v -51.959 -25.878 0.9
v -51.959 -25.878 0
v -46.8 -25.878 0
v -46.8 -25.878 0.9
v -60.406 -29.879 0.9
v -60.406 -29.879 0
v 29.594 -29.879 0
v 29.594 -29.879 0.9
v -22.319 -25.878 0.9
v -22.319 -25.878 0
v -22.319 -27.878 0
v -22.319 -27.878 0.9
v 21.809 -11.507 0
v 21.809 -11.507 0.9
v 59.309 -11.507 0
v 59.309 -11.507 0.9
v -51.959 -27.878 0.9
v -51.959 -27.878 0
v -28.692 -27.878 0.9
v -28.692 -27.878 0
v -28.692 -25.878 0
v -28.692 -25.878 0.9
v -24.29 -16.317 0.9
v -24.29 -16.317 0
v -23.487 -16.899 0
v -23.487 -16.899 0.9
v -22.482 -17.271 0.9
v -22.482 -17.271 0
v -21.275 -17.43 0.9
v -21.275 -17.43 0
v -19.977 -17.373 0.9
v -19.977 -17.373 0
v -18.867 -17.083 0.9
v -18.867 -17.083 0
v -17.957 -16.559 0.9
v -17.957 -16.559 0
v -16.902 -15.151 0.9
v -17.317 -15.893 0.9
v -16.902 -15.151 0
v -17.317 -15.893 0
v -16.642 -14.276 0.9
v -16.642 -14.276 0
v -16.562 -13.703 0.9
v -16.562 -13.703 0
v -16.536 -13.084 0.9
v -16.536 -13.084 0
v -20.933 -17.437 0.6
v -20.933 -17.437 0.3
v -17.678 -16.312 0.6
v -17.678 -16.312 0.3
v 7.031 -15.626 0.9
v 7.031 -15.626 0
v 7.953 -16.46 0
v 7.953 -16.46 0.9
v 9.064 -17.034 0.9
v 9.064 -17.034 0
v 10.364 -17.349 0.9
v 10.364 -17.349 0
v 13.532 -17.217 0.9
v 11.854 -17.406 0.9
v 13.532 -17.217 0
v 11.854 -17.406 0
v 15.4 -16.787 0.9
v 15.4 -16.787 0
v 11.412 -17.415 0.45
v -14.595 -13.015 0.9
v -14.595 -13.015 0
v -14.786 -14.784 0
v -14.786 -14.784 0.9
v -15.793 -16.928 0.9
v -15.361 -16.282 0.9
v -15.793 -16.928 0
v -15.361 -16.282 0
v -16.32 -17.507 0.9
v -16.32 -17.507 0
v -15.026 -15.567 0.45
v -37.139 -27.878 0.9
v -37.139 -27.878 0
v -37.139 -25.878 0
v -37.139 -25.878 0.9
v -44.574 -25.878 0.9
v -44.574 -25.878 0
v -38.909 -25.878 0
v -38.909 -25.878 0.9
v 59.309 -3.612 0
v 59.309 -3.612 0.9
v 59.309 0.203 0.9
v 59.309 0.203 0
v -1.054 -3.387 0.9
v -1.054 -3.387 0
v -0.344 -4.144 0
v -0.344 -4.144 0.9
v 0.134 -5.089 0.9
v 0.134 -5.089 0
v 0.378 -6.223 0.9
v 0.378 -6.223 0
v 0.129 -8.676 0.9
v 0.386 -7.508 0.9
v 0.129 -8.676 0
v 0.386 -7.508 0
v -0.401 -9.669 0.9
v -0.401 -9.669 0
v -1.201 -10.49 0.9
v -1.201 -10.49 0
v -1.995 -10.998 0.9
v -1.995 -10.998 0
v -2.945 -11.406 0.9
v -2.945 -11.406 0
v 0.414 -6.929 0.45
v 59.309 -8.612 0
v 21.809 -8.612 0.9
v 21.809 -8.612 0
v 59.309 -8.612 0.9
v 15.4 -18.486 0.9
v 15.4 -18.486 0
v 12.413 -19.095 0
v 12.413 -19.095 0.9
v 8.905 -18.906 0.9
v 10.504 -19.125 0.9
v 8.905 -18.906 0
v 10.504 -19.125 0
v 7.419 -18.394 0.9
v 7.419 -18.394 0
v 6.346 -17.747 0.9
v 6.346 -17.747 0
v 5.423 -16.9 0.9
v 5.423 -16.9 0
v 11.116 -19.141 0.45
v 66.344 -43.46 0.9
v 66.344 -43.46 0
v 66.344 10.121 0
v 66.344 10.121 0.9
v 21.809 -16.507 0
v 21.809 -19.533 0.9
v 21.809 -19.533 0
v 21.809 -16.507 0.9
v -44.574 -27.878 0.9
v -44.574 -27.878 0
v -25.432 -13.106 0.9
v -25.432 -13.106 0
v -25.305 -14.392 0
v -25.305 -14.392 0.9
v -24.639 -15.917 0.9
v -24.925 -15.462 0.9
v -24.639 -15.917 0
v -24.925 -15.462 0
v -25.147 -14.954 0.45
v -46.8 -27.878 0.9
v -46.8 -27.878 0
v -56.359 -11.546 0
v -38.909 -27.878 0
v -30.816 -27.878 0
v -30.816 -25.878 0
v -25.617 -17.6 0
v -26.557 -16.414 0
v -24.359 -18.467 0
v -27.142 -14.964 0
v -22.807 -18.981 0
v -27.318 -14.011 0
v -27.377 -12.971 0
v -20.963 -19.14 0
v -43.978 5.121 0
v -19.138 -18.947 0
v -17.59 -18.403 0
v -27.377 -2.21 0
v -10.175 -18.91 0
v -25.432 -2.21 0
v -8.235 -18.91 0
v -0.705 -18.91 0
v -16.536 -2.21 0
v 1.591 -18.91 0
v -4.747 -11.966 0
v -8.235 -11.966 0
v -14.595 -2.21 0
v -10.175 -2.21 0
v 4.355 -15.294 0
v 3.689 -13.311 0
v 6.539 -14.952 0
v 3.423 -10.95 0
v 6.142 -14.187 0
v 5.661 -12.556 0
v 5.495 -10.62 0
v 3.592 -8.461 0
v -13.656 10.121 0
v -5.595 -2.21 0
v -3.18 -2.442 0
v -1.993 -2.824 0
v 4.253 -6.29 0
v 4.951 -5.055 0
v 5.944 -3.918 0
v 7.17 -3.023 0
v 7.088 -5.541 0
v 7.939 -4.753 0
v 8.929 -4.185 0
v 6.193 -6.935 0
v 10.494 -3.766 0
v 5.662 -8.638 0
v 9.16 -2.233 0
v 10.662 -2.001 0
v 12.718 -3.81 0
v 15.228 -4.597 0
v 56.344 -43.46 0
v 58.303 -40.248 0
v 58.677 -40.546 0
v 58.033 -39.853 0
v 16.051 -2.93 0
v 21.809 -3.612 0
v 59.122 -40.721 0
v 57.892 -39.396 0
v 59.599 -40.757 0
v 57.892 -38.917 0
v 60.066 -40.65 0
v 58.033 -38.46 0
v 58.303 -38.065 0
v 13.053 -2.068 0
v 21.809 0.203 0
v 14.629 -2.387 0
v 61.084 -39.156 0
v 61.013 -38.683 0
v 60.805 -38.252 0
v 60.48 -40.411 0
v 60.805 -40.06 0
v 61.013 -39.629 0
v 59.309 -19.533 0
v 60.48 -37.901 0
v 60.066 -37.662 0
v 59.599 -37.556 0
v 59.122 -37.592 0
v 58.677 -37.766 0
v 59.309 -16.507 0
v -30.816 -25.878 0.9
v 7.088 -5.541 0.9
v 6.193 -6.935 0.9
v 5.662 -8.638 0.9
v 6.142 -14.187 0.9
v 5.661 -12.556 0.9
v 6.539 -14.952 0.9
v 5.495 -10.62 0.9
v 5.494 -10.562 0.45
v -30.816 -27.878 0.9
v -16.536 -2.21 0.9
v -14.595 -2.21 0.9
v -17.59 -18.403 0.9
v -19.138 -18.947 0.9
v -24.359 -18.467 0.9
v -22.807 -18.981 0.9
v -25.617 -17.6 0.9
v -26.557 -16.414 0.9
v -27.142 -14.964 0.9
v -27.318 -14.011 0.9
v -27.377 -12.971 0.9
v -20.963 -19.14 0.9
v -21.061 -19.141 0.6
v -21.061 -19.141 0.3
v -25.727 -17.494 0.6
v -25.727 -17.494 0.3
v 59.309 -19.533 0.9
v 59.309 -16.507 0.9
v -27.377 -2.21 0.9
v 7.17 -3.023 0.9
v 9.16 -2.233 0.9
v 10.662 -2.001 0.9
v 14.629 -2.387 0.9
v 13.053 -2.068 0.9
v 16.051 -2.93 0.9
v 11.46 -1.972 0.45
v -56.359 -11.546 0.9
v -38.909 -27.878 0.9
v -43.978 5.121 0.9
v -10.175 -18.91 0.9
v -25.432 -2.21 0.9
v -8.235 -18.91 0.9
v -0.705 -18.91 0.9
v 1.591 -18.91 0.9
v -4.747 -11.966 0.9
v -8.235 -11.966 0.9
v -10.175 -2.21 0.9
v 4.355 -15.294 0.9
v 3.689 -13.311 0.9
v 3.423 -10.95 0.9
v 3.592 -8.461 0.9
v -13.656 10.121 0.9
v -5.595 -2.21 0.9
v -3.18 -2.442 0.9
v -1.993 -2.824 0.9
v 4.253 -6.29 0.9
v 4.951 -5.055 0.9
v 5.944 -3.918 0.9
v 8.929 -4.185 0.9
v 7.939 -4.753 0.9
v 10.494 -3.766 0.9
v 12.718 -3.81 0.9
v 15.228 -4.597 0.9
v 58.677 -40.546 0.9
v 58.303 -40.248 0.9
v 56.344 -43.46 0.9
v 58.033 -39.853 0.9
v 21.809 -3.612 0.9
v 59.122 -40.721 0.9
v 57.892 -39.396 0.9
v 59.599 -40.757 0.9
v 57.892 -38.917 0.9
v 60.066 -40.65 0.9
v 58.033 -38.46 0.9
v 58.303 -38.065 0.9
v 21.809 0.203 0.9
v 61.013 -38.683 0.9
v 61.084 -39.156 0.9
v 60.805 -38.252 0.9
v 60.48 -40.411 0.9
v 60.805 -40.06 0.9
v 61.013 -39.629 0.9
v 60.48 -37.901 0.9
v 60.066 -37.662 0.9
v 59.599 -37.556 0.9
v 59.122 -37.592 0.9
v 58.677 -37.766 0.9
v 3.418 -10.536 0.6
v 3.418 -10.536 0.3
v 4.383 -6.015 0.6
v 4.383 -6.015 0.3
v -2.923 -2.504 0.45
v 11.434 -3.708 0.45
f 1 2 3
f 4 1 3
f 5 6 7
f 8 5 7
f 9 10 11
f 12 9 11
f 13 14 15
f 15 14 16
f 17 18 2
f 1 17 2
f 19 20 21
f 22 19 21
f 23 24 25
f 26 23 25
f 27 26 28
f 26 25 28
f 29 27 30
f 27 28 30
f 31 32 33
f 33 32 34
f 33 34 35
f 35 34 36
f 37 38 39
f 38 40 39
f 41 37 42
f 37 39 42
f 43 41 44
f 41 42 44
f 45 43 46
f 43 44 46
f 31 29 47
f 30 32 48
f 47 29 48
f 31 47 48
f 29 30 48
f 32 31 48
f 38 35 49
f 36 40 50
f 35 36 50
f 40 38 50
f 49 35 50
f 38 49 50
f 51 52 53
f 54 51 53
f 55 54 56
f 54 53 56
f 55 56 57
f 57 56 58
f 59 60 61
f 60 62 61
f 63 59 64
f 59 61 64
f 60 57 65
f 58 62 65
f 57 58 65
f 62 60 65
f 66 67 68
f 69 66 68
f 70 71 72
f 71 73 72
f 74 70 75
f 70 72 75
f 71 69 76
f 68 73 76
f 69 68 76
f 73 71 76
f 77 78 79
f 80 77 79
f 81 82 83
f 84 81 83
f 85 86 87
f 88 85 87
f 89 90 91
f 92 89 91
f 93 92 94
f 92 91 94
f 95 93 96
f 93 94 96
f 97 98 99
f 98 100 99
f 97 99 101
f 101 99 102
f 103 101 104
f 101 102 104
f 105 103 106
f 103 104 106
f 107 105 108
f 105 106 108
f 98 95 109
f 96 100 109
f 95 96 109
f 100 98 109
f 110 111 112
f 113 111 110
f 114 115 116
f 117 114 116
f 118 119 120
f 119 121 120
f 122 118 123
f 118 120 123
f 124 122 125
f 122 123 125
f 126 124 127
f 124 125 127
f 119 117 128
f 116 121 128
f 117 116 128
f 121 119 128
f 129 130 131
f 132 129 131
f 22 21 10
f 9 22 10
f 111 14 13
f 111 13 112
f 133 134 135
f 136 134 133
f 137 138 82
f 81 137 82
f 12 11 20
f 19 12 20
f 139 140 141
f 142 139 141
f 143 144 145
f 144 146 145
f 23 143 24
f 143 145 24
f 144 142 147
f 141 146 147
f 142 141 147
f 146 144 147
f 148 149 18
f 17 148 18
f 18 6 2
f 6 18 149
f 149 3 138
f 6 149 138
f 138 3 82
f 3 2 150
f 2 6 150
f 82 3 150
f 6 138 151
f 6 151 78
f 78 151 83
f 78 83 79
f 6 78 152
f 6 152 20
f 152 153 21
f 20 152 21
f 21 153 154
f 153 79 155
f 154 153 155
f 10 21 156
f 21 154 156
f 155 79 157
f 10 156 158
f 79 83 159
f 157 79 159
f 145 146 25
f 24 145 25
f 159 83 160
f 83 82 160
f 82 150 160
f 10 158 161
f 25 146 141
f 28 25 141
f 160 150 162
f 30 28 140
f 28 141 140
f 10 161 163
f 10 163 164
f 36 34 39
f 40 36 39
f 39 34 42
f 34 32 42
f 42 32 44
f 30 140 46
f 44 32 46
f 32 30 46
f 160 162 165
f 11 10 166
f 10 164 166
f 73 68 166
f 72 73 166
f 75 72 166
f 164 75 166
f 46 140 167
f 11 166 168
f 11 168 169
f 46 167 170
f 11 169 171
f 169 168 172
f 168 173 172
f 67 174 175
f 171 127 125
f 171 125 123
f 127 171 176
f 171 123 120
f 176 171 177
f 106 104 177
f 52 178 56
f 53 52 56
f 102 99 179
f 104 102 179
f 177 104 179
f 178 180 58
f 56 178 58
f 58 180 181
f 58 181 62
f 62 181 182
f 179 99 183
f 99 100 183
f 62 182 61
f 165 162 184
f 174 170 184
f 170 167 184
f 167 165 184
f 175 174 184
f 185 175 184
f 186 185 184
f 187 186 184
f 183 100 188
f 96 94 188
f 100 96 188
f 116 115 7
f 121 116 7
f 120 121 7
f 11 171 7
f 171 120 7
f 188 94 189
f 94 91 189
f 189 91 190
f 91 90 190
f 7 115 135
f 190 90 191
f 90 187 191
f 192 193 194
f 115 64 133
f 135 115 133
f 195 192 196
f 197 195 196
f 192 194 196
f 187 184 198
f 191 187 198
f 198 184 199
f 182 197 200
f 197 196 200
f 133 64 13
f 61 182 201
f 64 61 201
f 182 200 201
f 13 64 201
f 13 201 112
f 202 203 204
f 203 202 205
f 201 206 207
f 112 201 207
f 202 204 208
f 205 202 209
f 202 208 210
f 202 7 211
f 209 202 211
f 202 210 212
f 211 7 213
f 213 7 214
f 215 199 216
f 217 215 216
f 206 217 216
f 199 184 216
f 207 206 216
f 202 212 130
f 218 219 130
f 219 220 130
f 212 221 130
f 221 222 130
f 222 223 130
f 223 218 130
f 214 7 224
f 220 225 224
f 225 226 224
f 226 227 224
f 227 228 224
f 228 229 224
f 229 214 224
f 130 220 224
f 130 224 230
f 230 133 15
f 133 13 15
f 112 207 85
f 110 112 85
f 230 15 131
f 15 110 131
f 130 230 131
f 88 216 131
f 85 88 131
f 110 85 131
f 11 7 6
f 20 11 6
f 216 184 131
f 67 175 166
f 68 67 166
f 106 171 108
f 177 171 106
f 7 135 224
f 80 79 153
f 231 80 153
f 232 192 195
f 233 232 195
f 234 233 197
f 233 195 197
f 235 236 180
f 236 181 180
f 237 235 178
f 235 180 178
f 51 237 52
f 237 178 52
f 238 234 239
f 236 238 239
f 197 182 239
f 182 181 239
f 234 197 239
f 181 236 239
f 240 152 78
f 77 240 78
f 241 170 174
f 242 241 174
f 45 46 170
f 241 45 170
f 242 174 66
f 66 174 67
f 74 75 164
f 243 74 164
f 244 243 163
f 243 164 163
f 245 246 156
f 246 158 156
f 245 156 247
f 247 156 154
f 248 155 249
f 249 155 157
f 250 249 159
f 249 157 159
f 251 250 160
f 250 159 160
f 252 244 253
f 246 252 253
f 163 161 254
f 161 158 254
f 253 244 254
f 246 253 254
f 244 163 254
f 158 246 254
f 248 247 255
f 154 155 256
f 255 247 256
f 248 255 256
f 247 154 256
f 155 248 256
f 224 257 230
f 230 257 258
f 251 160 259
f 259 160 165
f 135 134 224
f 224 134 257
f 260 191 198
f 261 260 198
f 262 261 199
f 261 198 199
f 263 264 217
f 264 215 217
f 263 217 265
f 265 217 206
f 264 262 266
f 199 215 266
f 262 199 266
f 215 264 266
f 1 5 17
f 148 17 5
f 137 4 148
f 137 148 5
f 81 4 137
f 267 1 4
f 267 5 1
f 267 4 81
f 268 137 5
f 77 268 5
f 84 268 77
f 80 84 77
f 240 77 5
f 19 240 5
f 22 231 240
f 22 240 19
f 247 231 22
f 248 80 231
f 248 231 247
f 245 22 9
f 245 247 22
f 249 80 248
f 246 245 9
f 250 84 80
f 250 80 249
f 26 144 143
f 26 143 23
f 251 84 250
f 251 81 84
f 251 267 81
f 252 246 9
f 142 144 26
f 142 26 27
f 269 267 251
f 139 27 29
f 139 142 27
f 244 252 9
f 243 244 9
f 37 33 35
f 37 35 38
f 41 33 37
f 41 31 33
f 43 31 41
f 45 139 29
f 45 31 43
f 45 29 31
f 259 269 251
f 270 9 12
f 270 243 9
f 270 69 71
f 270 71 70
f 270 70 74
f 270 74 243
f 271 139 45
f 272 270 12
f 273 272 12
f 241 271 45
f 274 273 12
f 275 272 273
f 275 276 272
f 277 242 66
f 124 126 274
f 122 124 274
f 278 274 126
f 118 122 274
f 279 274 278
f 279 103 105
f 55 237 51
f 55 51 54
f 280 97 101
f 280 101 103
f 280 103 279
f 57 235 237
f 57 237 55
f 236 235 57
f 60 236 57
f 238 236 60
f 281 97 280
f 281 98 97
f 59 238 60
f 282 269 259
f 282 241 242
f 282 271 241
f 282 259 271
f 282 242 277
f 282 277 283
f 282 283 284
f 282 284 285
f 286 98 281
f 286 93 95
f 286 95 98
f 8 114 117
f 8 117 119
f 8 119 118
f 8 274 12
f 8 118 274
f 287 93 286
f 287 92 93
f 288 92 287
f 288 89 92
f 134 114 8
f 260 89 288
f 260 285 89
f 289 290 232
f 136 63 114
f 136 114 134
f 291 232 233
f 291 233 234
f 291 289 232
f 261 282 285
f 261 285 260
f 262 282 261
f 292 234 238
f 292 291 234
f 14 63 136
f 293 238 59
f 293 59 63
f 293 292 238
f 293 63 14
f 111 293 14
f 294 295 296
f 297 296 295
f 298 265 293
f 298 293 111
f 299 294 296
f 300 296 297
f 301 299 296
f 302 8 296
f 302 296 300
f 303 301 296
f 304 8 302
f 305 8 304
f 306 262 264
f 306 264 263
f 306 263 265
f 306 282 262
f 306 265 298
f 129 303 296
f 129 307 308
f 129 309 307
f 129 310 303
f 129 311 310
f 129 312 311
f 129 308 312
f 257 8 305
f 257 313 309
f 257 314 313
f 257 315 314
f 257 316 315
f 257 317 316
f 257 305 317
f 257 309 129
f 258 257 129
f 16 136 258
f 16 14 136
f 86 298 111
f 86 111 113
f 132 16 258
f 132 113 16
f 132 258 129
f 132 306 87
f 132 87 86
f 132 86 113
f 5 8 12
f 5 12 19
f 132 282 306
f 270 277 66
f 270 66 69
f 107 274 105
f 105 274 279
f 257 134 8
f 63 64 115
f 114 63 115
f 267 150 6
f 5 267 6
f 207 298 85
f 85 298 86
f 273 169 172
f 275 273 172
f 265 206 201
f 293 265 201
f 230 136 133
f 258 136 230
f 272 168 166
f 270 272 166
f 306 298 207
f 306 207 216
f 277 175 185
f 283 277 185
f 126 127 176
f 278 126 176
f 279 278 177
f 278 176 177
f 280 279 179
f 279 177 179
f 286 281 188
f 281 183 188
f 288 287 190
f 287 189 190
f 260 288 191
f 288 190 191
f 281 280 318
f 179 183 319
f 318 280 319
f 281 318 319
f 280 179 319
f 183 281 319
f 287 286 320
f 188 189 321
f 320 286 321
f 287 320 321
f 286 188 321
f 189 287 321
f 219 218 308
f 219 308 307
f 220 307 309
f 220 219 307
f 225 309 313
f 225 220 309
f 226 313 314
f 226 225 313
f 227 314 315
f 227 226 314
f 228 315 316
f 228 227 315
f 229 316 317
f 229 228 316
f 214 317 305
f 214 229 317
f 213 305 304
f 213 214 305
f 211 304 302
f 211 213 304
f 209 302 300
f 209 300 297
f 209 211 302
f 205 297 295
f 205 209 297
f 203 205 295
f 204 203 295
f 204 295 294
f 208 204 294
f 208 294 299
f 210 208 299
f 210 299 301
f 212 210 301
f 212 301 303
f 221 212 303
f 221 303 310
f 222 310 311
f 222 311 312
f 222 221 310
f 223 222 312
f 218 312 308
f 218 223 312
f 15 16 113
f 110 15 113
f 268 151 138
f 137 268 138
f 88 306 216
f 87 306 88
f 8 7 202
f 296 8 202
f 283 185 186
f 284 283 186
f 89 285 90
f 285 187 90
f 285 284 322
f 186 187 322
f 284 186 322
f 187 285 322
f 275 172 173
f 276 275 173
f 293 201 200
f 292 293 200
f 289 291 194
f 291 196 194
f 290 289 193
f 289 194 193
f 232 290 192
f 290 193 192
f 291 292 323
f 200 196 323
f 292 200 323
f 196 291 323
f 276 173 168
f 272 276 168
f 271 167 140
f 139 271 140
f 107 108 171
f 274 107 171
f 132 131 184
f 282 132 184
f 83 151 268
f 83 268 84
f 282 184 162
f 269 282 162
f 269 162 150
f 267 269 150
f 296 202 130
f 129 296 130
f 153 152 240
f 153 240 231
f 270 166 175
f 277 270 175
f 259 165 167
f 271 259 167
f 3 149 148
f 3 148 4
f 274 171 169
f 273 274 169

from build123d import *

# Parameters (mm, degrees)
F0_R     = 1.6050327283
F0_W     = 2.2255629301
F0_H     = 2
F0_W_2   = 1.7703343183
F0_W_3   = 2.1244008094
F1_DEPTH = 0.9
F3_W     = 37.4999957172
F3_H     = 3.8157890567
F3_H_2   = 3.0263150231
F3_H_3   = 2.8947356249
F4_DEPTH = 0.9


with BuildPart() as f1:
    # F0 (on Top) → F1 (new body)
    with BuildSketch(Plane.XY):
        Polygon((-56.3586414655, -11.5456737704), (-60.406261386, -29.879005636), (29.593738614, -29.879005636), (56.3437383481, -43.4597830152), (66.3437383481, -43.4597830152), (66.3437383481, 10.120994364), (-13.6562616519, 10.120994364), (-43.9776898843, 5.1209918552), align=None)
        Polygon((-51.9591234624, -27.8780460358), (-51.9591234624, -25.8780460358), (-46.79986462, -25.8780460358), (-44.5743016899, -25.8780460358), (-38.9092303813, -25.8780460358), (-37.138896063, -25.8780460358), (-30.8162737638, -25.8780460358), (-28.6918729544, -25.8780460358), (-22.3186686635, -25.8780460358), (-22.3186686635, -27.8780460358), (-28.6918729544, -27.8780460358), (-30.8162737638, -27.8780460358), (-37.138896063, -27.8780460358), (-38.9092303813, -27.8780460358), (-44.5743016899, -27.8780460358), (-46.79986462, -27.8780460358), align=None, mode=Mode.SUBTRACT)
        with Locations((59.4792403281, -39.1563028097)):
            Circle(F0_R, mode=Mode.SUBTRACT)
        with BuildLine():
            Line((-16.5355233229, -2.2097615232), (-14.5946062265, -2.2097615232))
            Line((-14.5946062265, -2.2097615232), (-14.5946062265, -13.0145655474))
            add(Edge.make_bspline(
                [(-14.5946062265, -13.0145655474), (-14.5946062265, -15.8729406309), (-16.3198658677, -17.5068199945)],
                knots=[0, 0, 0, 1, 1, 1], degree=2))
            add(Edge.make_bspline(
                [(-16.3198658677, -17.5068199945), (-18.045125509, -19.1406993581), (-21.06067467, -19.1406993581)],
                knots=[0, 0, 0, 1, 1, 1], degree=2))
            add(Edge.make_bspline(
                [(-21.06067467, -19.1406993581), (-24.076223831, -19.1406993581), (-25.7265516446, -17.4940267556)],
                knots=[0, 0, 0, 1, 1, 1], degree=2))
            add(Edge.make_bspline(
                [(-25.7265516446, -17.4940267556), (-27.3768794581, -15.8473541532), (-27.3768794581, -12.9707030141)],
                knots=[0, 0, 0, 1, 1, 1], degree=2))
            Line((-27.3768794581, -12.9707030141), (-27.3768794581, -2.2097615232))
            Line((-27.3768794581, -2.2097615232), (-25.4323071507, -2.2097615232))
            Line((-25.4323071507, -2.2097615232), (-25.4323071507, -13.105945825))
            add(Edge.make_bspline(
                [(-25.4323071507, -13.105945825), (-25.4323071507, -15.1967265766), (-24.2900536806, -16.3170487801)],
                knots=[0, 0, 0, 1, 1, 1], degree=2))
            add(Edge.make_bspline(
                [(-24.2900536806, -16.3170487801), (-23.1478002105, -17.4373709835), (-20.9327422813, -17.4373709835)],
                knots=[0, 0, 0, 1, 1, 1], degree=2))
            add(Edge.make_bspline(
                [(-20.9327422813, -17.4373709835), (-18.8200302631, -17.4373709835), (-17.677776793, -16.3115659634)],
                knots=[0, 0, 0, 1, 1, 1], degree=2))
            add(Edge.make_bspline(
                [(-17.677776793, -16.3115659634), (-16.5355233229, -15.1857609433), (-16.5355233229, -13.0840145583)],
                knots=[0, 0, 0, 1, 1, 1], degree=2))
            Line((-16.5355233229, -13.0840145583), (-16.5355233229, -2.2097615232))
        make_face(mode=Mode.SUBTRACT)
        with BuildLine():
            Line((-4.7474675117, -11.9655199604), (-8.2345389051, -11.9655199604))
            Line((-8.2345389051, -11.9655199604), (-8.2345389051, -18.9104210585))
            Line((-8.2345389051, -18.9104210585), (-10.1754560015, -18.9104210585))
            Line((-10.1754560015, -18.9104210585), (-10.1754560015, -2.2097615232))
            Line((-10.1754560015, -2.2097615232), (-5.5954764878, -2.2097615232))
            add(Edge.make_bspline(
                [(-5.5954764878, -2.2097615232), (-2.5214439492, -2.2097615232), (-1.0538766908, -3.3867394987)],
                knots=[0, 0, 0, 1, 1, 1], degree=2))
            add(Edge.make_bspline(
                [(-1.0538766908, -3.3867394987), (0.4136905676, -4.5637174743), (0.4136905676, -6.9286390588)],
                knots=[0, 0, 0, 1, 1, 1], degree=2))
            add(Edge.make_bspline(
                [(0.4136905676, -6.9286390588), (0.4136905676, -10.2402603192), (-2.9454484373, -11.4062726615)],
                knots=[0, 0, 0, 1, 1, 1], degree=2))
            Line((-2.9454484373, -11.4062726615), (1.5906685431, -18.9104210585))
            Line((1.5906685431, -18.9104210585), (-0.7048040303, -18.9104210585))
            Line((-0.7048040303, -18.9104210585), (-4.7474675117, -11.9655199604))
        make_face(mode=Mode.SUBTRACT)
        with BuildLine():
            add(Edge.make_bspline(
                [(15.2282611731, -4.5966143742), (13.33120661, -3.7083980759), (11.4341520469, -3.7083980759)],
                knots=[0, 0, 0, 1, 1, 1], degree=2))
            add(Edge.make_bspline(
                [(11.4341520469, -3.7083980759), (8.6817780854, -3.7083980759), (7.0881060439, -5.5414864447)],
                knots=[0, 0, 0, 1, 1, 1], degree=2))
            add(Edge.make_bspline(
                [(7.0881060439, -5.5414864447), (5.4944340025, -7.3745748135), (5.4944340025, -10.5619188964)],
                knots=[0, 0, 0, 1, 1, 1], degree=2))
            add(Edge.make_bspline(
                [(5.4944340025, -10.5619188964), (5.4944340025, -13.8369880458), (7.0314502718, -15.6262138814)],
                knots=[0, 0, 0, 1, 1, 1], degree=2))
            add(Edge.make_bspline(
                [(7.0314502718, -15.6262138814), (8.5684665412, -17.4154397169), (11.4122207803, -17.4154397169)],
                knots=[0, 0, 0, 1, 1, 1], degree=2))
            add(Edge.make_bspline(
                [(11.4122207803, -17.4154397169), (13.1594116881, -17.4154397169), (15.400056095, -16.786743407)],
                knots=[0, 0, 0, 1, 1, 1], degree=2))
            Line((15.400056095, -16.786743407), (15.400056095, -18.4864165704))
            add(Edge.make_bspline(
                [(15.400056095, -18.4864165704), (13.6638308205, -19.1406993581), (11.1161486808, -19.1406993581)],
                knots=[0, 0, 0, 1, 1, 1], degree=2))
            add(Edge.make_bspline(
                [(11.1161486808, -19.1406993581), (7.4280406766, -19.1406993581), (5.4231573859, -16.9000549512)],
                knots=[0, 0, 0, 1, 1, 1], degree=2))
            add(Edge.make_bspline(
                [(5.4231573859, -16.9000549512), (3.4182740953, -14.6594105443), (3.4182740953, -10.5363324187)],
                knots=[0, 0, 0, 1, 1, 1], degree=2))
            add(Edge.make_bspline(
                [(3.4182740953, -10.5363324187), (3.4182740953, -7.9557533791), (4.3832498268, -6.0148362827)],
                knots=[0, 0, 0, 1, 1, 1], degree=2))
            add(Edge.make_bspline(
                [(4.3832498268, -6.0148362827), (5.3482255583, -4.0739191863), (7.1703482938, -3.0230459939)],
                knots=[0, 0, 0, 1, 1, 1], degree=2))
            add(Edge.make_bspline(
                [(7.1703482938, -3.0230459939), (8.9924710293, -1.9721728014), (11.4597385246, -1.9721728014)],
                knots=[0, 0, 0, 1, 1, 1], degree=2))
            add(Edge.make_bspline(
                [(11.4597385246, -1.9721728014), (14.0841800975, -1.9721728014), (16.0506836716, -2.9298381107)],
                knots=[0, 0, 0, 1, 1, 1], degree=2))
            Line((16.0506836716, -2.9298381107), (15.2282611731, -4.5966143742))
        make_face(mode=Mode.SUBTRACT)
        with Locations((-45.6870831549, -26.8780460358)):
            Rectangle(F0_W, F0_H)
        with Locations((-38.0240632221, -26.8780460358)):
            Rectangle(F0_W_2, F0_H)
        with Locations((-29.7540733591, -26.8780460358)):
            Rectangle(F0_W_3, F0_H)
    extrude(amount=F1_DEPTH)

    # F3 (on face) → F4 (cut, through all)
    with BuildSketch(Plane.XY.offset(0.9)):
        with Locations((40.5594706535, -1.704487608)):
            Rectangle(F3_W, F3_H)
        with Locations((40.5594706535, -18.0202752728)):
            Rectangle(F3_W, F3_H_2)
        with Locations((40.5594706535, -10.0597499488)):
            Rectangle(F3_W, F3_H_3)
    extrude(amount=-F4_DEPTH, mode=Mode.SUBTRACT)


solid = f1.part
